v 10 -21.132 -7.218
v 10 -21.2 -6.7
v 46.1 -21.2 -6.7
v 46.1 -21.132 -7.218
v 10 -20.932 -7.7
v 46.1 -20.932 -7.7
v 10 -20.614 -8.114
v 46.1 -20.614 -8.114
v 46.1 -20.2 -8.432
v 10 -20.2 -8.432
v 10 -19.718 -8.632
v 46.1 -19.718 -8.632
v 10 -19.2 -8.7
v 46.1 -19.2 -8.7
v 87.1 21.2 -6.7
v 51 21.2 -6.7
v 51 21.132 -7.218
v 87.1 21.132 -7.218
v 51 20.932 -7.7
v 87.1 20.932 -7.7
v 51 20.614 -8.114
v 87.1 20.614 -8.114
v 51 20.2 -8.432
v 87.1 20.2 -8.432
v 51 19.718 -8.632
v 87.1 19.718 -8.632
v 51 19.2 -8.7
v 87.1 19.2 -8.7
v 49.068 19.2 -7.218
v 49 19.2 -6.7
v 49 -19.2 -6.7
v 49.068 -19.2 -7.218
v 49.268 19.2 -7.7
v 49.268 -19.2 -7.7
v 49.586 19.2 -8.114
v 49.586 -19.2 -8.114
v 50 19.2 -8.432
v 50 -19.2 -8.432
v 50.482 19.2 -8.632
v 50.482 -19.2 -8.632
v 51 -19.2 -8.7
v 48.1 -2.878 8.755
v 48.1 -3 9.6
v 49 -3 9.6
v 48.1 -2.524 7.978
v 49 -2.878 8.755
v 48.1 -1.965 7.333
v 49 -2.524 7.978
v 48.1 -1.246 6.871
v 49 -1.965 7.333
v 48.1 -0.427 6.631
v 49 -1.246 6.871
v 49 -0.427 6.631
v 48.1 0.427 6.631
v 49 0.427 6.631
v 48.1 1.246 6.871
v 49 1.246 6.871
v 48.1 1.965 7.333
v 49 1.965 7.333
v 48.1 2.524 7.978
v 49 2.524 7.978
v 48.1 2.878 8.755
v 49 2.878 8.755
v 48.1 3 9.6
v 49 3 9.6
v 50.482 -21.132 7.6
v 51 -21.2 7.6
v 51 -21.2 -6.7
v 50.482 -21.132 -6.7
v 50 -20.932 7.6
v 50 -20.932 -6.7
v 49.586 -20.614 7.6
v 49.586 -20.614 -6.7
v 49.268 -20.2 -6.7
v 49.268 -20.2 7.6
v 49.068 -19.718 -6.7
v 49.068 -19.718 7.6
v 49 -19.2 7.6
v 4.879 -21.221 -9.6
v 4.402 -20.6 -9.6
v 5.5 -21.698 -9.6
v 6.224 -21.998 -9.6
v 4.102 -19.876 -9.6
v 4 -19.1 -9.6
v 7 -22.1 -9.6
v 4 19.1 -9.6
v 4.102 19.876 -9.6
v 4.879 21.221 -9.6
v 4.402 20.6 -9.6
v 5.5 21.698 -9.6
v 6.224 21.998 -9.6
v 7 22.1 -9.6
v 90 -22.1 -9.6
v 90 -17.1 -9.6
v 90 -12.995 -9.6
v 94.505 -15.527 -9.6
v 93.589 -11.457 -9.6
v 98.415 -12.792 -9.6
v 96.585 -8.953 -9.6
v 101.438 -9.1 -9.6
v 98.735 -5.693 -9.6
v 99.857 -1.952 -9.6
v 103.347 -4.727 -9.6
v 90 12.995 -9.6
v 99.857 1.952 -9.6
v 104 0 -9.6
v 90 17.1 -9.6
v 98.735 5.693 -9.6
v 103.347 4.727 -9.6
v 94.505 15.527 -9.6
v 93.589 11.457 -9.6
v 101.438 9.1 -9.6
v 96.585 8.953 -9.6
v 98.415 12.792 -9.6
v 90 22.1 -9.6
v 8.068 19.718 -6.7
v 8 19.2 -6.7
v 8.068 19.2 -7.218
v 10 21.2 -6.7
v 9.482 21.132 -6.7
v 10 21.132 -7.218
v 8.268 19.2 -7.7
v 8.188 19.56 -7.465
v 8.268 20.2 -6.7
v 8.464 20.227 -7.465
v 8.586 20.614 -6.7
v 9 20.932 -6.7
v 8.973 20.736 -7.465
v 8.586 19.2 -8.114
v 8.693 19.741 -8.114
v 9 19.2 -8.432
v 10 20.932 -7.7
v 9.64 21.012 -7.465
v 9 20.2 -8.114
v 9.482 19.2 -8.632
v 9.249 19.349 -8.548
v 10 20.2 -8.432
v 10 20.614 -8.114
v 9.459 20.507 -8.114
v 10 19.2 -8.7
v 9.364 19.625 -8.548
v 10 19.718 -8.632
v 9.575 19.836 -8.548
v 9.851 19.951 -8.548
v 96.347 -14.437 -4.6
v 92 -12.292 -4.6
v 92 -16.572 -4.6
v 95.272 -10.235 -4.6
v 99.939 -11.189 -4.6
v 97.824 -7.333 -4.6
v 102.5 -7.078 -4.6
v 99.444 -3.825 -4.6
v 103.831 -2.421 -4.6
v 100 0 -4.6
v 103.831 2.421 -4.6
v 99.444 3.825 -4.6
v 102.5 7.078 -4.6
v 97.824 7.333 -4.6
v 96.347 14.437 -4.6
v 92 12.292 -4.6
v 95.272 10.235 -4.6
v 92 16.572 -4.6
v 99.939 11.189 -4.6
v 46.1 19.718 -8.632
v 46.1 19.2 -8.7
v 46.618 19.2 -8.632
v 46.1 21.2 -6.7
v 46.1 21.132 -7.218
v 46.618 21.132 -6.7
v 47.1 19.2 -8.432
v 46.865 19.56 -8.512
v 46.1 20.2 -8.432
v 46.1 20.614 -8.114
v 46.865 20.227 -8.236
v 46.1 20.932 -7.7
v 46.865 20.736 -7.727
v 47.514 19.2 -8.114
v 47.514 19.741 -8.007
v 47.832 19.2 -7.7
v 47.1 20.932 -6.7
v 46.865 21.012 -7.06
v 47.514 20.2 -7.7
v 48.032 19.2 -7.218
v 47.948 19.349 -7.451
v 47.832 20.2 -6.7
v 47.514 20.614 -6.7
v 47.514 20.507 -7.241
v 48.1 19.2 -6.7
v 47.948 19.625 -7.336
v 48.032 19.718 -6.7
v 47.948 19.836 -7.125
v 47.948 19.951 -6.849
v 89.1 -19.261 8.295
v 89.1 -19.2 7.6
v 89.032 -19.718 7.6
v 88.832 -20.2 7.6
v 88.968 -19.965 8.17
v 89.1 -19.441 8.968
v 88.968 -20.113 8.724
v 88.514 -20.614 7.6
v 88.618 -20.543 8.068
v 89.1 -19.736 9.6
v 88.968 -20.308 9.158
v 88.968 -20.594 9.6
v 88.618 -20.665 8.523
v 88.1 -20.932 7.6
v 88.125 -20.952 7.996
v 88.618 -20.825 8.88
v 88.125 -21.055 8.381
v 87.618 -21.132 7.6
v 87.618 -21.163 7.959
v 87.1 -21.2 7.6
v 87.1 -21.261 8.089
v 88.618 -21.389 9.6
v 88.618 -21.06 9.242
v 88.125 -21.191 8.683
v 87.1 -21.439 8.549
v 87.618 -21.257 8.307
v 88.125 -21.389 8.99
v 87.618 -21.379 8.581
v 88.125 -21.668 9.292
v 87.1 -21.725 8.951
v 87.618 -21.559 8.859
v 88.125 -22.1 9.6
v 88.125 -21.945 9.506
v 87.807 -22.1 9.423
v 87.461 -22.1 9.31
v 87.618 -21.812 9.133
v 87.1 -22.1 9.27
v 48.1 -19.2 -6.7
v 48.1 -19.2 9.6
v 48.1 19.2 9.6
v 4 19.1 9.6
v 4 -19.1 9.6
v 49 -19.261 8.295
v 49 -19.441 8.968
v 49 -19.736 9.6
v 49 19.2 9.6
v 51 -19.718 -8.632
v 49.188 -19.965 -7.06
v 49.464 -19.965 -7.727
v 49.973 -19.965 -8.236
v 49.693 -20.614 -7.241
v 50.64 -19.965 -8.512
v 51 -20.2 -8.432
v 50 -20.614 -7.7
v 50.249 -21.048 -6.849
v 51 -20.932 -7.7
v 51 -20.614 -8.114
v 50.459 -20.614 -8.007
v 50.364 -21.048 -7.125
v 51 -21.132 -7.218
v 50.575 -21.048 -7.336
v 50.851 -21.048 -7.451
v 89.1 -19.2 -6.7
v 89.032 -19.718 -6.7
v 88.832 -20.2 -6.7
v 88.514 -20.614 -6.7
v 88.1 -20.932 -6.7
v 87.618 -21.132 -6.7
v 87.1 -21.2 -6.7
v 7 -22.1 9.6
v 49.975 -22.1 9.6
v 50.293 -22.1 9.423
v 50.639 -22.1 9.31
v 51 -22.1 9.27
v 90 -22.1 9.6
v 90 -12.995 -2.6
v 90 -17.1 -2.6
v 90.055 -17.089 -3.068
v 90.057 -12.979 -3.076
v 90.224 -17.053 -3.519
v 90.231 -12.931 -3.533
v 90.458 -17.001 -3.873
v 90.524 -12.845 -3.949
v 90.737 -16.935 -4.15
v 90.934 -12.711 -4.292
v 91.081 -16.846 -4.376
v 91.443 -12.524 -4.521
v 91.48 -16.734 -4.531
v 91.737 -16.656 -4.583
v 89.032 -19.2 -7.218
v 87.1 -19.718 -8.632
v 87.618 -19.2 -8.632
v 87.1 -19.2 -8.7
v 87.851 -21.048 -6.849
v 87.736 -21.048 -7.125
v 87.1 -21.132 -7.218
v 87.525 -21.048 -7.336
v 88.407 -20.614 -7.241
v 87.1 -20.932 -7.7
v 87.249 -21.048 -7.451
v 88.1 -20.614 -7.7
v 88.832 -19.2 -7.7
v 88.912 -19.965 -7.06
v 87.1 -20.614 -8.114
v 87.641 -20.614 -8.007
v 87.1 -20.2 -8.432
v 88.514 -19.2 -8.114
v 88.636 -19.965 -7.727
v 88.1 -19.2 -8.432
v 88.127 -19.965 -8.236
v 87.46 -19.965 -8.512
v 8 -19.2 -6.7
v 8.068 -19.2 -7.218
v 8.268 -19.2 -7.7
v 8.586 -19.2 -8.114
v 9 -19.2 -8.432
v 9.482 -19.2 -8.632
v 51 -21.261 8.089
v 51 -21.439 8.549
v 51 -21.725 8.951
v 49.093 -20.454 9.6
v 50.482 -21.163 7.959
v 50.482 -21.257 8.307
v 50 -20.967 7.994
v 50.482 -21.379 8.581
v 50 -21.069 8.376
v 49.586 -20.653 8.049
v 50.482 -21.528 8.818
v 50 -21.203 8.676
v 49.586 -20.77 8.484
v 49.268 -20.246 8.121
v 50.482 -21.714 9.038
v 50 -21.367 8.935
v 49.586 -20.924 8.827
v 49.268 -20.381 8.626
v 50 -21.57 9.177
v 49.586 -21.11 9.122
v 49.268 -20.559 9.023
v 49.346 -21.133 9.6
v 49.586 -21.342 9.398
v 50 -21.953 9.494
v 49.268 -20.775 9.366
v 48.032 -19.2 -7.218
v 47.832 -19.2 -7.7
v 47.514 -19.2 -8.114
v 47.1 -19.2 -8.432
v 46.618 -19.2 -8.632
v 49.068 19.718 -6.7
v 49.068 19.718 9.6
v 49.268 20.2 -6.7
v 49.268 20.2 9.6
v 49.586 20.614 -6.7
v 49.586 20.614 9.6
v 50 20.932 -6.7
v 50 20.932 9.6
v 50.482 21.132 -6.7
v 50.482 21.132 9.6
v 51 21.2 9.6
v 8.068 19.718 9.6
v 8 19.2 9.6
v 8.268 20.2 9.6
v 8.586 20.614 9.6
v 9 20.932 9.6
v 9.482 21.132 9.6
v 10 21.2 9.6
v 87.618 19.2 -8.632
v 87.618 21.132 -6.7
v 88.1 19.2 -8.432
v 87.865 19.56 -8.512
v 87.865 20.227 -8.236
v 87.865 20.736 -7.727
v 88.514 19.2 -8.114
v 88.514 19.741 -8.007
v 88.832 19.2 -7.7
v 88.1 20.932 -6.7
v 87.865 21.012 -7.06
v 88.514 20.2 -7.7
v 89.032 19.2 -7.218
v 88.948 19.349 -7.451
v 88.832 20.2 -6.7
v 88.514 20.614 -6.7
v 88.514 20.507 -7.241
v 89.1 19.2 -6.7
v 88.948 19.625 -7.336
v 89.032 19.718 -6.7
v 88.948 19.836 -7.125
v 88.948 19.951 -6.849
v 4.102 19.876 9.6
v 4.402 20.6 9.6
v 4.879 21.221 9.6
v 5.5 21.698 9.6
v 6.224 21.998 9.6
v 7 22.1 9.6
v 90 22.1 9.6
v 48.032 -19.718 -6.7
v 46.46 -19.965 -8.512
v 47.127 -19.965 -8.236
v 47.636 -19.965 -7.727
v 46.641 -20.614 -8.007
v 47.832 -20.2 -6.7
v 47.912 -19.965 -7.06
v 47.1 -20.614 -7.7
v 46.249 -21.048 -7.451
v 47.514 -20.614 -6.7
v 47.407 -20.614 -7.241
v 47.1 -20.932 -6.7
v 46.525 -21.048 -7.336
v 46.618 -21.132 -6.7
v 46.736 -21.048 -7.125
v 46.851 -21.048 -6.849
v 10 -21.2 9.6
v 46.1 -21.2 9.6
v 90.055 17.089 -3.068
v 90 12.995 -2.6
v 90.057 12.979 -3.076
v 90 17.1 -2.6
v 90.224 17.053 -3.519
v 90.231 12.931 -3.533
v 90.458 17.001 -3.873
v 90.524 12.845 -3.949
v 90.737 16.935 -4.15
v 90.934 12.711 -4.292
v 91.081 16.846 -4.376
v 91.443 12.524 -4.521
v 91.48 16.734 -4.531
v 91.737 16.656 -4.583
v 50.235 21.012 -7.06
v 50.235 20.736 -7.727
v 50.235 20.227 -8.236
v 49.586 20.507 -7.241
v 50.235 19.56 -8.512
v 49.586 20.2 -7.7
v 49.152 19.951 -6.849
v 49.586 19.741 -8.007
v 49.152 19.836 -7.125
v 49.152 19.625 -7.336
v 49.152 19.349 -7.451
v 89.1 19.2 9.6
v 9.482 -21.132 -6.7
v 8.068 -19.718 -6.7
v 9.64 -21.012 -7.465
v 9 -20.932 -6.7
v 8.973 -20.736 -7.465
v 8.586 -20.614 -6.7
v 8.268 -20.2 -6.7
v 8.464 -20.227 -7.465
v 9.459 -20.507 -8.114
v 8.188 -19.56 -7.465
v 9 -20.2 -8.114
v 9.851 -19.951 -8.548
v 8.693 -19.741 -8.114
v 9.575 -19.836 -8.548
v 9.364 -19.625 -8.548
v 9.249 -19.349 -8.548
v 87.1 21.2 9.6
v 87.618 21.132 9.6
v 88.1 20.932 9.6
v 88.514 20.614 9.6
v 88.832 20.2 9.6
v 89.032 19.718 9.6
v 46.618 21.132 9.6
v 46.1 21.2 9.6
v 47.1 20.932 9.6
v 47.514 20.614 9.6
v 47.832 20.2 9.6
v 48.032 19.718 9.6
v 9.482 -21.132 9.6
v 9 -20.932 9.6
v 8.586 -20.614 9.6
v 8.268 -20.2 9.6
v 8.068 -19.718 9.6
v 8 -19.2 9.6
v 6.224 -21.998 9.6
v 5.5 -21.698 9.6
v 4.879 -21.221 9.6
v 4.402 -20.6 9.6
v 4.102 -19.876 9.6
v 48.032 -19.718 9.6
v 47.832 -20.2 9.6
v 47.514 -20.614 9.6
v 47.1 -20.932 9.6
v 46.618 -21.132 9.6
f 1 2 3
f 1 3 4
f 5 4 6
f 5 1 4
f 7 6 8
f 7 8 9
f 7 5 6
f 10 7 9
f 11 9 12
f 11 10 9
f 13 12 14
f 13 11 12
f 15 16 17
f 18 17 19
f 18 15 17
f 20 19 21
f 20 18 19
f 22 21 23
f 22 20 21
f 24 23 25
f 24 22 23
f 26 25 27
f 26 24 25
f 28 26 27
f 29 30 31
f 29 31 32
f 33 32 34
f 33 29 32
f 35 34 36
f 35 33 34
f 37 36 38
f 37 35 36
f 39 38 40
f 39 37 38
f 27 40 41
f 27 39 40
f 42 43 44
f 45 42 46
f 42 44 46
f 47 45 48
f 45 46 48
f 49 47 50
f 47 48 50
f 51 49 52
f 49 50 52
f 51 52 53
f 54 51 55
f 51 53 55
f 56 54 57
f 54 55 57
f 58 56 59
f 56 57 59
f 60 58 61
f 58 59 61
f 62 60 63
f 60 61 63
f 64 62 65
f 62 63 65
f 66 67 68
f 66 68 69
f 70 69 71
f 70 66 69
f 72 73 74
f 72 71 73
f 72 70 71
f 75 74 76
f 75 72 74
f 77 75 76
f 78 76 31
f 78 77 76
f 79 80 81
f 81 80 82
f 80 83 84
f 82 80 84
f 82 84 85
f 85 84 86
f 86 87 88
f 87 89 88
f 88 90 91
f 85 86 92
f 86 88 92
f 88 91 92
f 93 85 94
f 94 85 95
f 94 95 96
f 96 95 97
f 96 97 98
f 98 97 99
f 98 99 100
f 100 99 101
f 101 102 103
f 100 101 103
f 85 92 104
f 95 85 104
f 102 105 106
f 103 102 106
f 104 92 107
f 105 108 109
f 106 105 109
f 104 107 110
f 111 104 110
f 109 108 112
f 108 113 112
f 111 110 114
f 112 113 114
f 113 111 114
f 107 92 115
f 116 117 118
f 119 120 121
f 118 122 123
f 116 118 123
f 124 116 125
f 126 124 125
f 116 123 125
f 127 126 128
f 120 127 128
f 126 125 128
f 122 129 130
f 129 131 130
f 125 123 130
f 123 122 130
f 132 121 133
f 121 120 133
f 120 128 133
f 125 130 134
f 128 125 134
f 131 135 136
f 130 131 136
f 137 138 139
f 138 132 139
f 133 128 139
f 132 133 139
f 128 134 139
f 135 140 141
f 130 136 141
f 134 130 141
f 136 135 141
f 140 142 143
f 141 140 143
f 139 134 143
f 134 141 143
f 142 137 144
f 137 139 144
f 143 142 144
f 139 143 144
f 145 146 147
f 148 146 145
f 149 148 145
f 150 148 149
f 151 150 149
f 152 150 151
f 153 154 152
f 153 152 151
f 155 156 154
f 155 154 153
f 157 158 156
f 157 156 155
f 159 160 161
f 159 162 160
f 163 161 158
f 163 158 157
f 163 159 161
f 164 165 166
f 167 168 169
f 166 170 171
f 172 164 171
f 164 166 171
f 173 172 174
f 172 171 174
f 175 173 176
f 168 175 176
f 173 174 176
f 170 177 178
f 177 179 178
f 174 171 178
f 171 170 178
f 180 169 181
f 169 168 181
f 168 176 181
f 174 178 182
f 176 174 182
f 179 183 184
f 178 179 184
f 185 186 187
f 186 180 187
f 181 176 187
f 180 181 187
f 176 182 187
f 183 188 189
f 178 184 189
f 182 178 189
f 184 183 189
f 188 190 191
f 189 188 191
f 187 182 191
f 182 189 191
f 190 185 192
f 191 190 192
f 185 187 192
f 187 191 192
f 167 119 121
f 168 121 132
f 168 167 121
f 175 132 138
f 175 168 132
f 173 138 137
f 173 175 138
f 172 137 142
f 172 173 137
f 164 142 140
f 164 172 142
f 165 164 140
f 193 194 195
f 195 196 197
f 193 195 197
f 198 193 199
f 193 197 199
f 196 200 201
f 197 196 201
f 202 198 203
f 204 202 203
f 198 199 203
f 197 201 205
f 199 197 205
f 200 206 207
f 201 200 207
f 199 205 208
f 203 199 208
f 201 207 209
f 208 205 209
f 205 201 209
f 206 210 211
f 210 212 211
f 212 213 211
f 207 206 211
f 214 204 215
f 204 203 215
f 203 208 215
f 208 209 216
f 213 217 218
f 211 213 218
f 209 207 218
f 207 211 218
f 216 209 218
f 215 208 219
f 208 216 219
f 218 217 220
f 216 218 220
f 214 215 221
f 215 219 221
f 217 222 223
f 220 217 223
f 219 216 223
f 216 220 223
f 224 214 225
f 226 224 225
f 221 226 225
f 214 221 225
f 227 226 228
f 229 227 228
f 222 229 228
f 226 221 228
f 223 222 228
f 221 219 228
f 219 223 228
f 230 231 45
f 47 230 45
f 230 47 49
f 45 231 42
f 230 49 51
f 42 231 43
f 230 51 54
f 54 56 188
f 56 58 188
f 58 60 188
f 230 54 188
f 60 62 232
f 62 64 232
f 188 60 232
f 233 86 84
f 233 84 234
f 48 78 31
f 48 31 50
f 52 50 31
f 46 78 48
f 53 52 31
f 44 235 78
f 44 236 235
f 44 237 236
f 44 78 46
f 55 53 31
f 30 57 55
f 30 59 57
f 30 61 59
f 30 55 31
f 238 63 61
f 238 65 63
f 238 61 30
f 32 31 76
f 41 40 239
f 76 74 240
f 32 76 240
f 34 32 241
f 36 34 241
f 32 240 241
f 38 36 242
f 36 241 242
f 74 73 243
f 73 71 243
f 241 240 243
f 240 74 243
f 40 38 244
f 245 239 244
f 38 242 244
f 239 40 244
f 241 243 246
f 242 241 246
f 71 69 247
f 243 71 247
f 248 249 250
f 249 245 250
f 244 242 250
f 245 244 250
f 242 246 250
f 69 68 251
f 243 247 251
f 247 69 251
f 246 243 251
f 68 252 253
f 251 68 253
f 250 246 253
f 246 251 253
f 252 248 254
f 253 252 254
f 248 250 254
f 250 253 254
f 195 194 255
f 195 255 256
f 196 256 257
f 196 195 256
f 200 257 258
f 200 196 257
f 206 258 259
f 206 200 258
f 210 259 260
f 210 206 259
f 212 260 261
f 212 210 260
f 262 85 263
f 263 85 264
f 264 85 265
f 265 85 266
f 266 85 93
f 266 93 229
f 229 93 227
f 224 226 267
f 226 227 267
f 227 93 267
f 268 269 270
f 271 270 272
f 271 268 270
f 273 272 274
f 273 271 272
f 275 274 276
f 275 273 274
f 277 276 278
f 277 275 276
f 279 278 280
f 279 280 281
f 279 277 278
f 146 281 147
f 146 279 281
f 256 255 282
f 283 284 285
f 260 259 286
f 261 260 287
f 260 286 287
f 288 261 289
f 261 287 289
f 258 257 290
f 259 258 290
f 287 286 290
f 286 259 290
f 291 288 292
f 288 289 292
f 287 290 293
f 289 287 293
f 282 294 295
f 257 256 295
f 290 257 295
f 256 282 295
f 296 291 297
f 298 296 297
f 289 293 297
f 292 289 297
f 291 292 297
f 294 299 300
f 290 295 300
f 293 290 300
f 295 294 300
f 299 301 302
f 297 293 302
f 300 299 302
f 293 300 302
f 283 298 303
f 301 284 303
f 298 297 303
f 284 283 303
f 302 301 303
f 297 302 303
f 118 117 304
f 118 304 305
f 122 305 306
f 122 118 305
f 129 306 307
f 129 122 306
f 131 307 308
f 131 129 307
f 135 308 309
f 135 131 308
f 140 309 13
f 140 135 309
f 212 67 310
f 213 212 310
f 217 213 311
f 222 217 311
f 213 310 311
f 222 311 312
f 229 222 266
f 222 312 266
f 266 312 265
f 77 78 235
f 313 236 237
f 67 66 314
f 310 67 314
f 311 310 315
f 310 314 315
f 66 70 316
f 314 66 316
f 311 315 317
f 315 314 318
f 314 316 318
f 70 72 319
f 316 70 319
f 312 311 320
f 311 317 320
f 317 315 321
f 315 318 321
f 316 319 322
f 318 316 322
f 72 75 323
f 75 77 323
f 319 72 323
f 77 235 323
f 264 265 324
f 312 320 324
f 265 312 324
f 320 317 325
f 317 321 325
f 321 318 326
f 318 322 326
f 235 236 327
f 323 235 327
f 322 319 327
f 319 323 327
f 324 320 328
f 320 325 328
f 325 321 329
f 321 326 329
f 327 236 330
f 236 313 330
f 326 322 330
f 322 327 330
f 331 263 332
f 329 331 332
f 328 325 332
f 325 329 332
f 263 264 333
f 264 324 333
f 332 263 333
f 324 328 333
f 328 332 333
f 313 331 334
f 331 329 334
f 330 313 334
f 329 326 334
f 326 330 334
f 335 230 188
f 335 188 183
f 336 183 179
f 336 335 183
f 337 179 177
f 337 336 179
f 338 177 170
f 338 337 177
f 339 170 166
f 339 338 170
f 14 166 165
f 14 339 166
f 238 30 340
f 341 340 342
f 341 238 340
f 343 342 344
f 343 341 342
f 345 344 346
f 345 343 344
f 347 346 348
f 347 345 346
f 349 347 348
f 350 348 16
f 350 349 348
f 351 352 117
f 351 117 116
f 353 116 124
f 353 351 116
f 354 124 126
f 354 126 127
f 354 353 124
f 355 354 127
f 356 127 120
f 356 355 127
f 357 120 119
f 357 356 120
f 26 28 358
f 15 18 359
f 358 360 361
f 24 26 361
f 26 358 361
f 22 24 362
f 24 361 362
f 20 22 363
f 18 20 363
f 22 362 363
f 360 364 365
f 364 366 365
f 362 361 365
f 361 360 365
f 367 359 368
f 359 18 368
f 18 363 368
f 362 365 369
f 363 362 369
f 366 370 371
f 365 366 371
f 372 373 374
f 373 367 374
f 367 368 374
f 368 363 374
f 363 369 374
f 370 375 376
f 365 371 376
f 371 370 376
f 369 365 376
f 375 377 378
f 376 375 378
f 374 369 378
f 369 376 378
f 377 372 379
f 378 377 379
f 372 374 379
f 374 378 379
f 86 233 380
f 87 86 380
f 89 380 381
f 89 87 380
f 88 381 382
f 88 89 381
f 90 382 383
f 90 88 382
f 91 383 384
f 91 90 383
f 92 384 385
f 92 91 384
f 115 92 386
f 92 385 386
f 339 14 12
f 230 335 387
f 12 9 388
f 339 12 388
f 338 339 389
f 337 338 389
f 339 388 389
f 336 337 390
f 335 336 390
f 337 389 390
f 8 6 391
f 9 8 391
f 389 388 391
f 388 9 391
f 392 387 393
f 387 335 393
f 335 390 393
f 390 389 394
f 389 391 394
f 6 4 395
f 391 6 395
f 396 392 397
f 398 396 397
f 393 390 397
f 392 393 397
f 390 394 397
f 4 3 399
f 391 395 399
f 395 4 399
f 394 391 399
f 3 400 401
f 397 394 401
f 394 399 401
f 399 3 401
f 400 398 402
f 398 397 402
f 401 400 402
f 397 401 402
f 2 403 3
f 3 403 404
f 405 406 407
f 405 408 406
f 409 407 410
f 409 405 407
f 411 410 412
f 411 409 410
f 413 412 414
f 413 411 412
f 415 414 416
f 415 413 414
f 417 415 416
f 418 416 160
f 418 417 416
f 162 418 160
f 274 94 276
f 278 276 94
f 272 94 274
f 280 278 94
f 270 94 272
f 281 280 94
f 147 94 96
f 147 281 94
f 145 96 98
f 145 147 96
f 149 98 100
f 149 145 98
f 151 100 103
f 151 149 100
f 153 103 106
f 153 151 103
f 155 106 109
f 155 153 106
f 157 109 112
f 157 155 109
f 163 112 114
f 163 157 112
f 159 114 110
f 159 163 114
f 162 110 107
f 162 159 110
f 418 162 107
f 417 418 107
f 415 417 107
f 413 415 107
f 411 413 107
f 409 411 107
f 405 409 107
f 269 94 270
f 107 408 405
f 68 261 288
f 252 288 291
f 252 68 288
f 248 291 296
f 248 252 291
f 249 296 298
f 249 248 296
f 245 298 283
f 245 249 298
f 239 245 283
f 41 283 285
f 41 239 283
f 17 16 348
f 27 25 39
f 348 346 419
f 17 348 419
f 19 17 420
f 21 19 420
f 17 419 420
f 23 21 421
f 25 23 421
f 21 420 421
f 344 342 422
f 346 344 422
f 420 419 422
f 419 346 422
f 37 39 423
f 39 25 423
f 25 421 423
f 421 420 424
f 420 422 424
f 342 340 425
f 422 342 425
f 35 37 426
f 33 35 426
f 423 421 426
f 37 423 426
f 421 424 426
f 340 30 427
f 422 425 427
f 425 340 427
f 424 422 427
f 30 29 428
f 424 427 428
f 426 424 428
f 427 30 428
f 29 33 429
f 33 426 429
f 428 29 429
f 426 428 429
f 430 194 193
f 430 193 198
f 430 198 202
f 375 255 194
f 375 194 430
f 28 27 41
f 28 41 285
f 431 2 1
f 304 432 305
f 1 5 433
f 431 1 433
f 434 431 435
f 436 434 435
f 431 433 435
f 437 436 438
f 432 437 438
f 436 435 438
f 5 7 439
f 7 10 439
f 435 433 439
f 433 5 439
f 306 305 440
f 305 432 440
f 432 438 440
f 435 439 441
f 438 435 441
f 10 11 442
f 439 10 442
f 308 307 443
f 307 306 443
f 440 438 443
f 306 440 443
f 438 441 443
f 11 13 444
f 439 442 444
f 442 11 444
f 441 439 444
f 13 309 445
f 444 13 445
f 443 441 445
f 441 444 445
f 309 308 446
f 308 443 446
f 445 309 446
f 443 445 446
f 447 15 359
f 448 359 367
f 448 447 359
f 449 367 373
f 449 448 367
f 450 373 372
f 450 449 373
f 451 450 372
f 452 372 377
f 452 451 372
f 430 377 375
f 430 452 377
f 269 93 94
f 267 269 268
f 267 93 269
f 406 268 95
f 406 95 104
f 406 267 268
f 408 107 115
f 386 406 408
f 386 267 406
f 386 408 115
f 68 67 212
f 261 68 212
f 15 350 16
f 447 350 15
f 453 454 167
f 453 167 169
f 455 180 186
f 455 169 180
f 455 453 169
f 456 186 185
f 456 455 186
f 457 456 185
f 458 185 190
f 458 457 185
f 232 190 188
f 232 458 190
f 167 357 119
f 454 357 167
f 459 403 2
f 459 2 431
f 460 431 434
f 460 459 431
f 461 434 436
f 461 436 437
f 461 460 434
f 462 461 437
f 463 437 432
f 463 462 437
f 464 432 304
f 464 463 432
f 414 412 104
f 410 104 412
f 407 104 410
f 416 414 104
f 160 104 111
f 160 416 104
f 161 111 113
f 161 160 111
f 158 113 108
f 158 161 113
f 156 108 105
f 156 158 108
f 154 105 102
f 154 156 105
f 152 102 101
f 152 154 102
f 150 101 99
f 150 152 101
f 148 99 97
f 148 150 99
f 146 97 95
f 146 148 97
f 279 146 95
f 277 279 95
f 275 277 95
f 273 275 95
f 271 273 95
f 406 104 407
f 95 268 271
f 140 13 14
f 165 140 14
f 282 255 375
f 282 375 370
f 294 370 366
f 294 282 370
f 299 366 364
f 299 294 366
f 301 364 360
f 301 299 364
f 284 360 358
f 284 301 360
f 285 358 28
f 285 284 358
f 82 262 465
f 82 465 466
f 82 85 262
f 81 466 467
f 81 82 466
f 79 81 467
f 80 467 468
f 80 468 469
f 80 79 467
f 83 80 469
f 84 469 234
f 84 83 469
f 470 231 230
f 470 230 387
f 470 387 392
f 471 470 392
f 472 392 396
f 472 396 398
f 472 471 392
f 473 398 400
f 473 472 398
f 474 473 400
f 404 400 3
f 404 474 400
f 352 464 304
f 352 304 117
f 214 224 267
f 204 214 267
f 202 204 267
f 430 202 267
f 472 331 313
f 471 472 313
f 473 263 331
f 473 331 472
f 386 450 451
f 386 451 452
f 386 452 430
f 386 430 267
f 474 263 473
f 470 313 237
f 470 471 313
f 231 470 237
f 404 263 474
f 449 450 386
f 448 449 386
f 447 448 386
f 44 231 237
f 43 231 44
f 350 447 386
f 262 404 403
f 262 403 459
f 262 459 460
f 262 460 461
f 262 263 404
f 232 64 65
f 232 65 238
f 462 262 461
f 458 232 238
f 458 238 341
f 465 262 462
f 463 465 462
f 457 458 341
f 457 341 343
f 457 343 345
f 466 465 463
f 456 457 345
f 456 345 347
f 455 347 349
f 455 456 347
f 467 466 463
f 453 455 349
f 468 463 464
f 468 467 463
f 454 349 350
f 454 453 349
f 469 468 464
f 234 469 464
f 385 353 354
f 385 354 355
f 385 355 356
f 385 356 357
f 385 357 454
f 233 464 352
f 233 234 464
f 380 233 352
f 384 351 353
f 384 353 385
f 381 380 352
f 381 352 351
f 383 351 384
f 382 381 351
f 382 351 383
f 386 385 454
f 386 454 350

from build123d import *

# Parameters (mm, degrees)
SKETCH_1_W                  = 86
SKETCH_1_H                  = 44.2
EXTRUDE_1_DEPTH             = 14.2
EXTRUDE_2_DEPTH             = 5
SKETCH_3_W                  = 40.1
SKETCH_3_H                  = 42.4
CUT_EXTRUDE_1_DEPTH         = 18.3
SKETCH_4_W                  = 40.1
SKETCH_4_H                  = 42.4
CUT_EXTRUDE_2_DEPTH         = 18.3
HOLE_WIZARD_8_3_8_3_1_D     = 8.3
HOLE_WIZARD_8_3_8_3_1_DEPTH = 3.2
HOLE_WIZARD_6_0_6_1_D       = 6
HOLE_WIZARD_6_0_6_1_DEPTH   = 0.9
FILLET_1_R                  = 3
EXTRUDE_START               = -3.5
SKETCH_9_R                  = 4.15
EXTRUDE_3_DEPTH             = 3.5
FILLET_2_R                  = 2
FILLET_3_R                  = 2
FILLET_4_R                  = 2
FILLET_5_R                  = 2


with BuildPart() as part:
    # Эскиз1 → Бобышка-Вытянуть1 (new body)
    with BuildSketch(Plane.XY.offset(9.6)):
        with Locations((47, 0)):
            Rectangle(SKETCH_1_W, SKETCH_1_H)
    extrude(amount=-EXTRUDE_1_DEPTH)

    # Эскиз2 → Бобышка-Вытянуть2 (add)
    with BuildSketch(Plane(origin=(0, 0, -4.6), x_dir=(-1, 0, 0), z_dir=(0, 0, -1))):
        with BuildLine():
            Line((-90, -22.1), (-90, -17.1))
            ThreePointArc((-90, -17.1), (-104, 0), (-90, 17.1))
            Line((-90, 17.1), (-90, 22.1))
            Line((-90, 22.1), (-4, 22.1))
            Line((-4, 22.1), (-4, -22.1))
            Line((-4, -22.1), (-90, -22.1))
        make_face()
        with BuildLine():
            Line((-90, -12.994779171), (-90, 12.994779171))
            ThreePointArc((-90, 12.994779171), (-100, 0), (-90, -12.994779171))
        make_face(mode=Mode.SUBTRACT)
    extrude(amount=EXTRUDE_2_DEPTH)

    # Эскиз3 → Вырез-Вытянуть1 (cut)
    with BuildSketch(Plane.XY.offset(9.6)):
        with Locations((28.05, 0)):
            Rectangle(SKETCH_3_W, SKETCH_3_H)
    extrude(amount=-CUT_EXTRUDE_1_DEPTH, mode=Mode.SUBTRACT)

    # Эскиз4 → Вырез-Вытянуть2 (cut)
    with BuildSketch(Plane.XY.offset(9.6)):
        with Locations((69.05, 0)):
            Rectangle(SKETCH_4_W, SKETCH_4_H)
    extrude(amount=-CUT_EXTRUDE_2_DEPTH, mode=Mode.SUBTRACT)

    # Диаметр отверстия Ø8.3 (8.3)1
    with Locations(Plane.ZY.offset(-4)):
        with Locations((0, 0)):
            Hole(HOLE_WIZARD_8_3_8_3_1_D / 2, depth=HOLE_WIZARD_8_3_8_3_1_DEPTH)

    # Диаметр отверстия Ø6.0 (6)1
    with Locations(Plane.ZY.offset(-48.1)):
        with Locations((9.6, 0)):
            Hole(HOLE_WIZARD_6_0_6_1_D / 2, depth=HOLE_WIZARD_6_0_6_1_DEPTH)

    # Скругление1
    fillet_1_edges = [part.edges().sort_by_distance(p)[0] for p in [
        (4, -22.1, 0),
        (4, 22.1, 0),
    ]]
    fillet(fillet_1_edges, radius=FILLET_1_R)

    # Эскиз9 → Бобышка-Вытянуть3 (add)
    with BuildSketch(Plane.ZY.offset(-4).offset(EXTRUDE_START)):
        Circle(SKETCH_9_R)
    extrude(amount=EXTRUDE_3_DEPTH)

    # Скругление2
    # the kernel refuses this fillet: 2 mm, written as the material it adds along each edge
    with BuildSketch(Plane(origin=(51, 19.2, -6.7), x_dir=(0, 1, 0), z_dir=(-1, 0, 0))) as fillet_2_piece_1_section:
        Polygon((0, 0), (FILLET_2_R * 1.02, 0), (FILLET_2_R * 1.02, FILLET_2_R * 1.02), (0, FILLET_2_R * 1.02), align=None)
    fillet_2_piece_1 = extrude(amount=FILLET_2_R * 1.02, mode=Mode.PRIVATE)
    fillet_2_piece_1 = fillet_2_piece_1 - Plane(origin=(51, 19.2, -6.7), x_dir=(0, -0.7071067811865475, 0.7071067811865475), z_dir=(-1, 0, 0)) * Sphere(FILLET_2_R, mode=Mode.PRIVATE)
    add(fillet_2_piece_1)
    with BuildSketch(Plane(origin=(46.1, -19.2, -6.7), x_dir=(0, 0, -1), z_dir=(0, -1, 0))) as fillet_2_piece_2_section:
        Polygon((0, 0), (FILLET_2_R * 1.02, 0), (FILLET_2_R * 1.02, FILLET_2_R * 1.02), (0, FILLET_2_R * 1.02), align=None)
    fillet_2_piece_2 = extrude(amount=FILLET_2_R * 1.02, mode=Mode.PRIVATE)
    fillet_2_piece_2 = fillet_2_piece_2 - Plane(origin=(46.1, -19.2, -6.7), x_dir=(-0.7071067811865475, 0, 0.7071067811865475), z_dir=(0, -1, 0)) * Sphere(FILLET_2_R, mode=Mode.PRIVATE)
    add(fillet_2_piece_2)
    with BuildSketch(Plane(origin=(10, -19.2, -6.7), x_dir=(-1, 0, 0), z_dir=(0, 0, -1))) as fillet_2_piece_3_section:
        Polygon((0, 0), (FILLET_2_R * 1.02, 0), (FILLET_2_R * 1.02, -FILLET_2_R * 1.02), (0, -FILLET_2_R * 1.02), align=None)
    fillet_2_piece_3 = extrude(amount=FILLET_2_R * 1.02, mode=Mode.PRIVATE)
    fillet_2_piece_3 = fillet_2_piece_3 - Plane(origin=(10, -19.2, -6.7), x_dir=(0.707106781186543, 0.7071067811865519, 0), z_dir=(0, 0, -1)) * Sphere(FILLET_2_R, mode=Mode.PRIVATE)
    add(fillet_2_piece_3)
    with BuildSketch(Plane(origin=(10, 19.2, -6.7), x_dir=(0, 1, 0), z_dir=(0, 0, -1))) as fillet_2_piece_4_section:
        Polygon((0, 0), (FILLET_2_R * 1.02, 0), (FILLET_2_R * 1.02, -FILLET_2_R * 1.02), (0, -FILLET_2_R * 1.02), align=None)
    fillet_2_piece_4 = extrude(amount=FILLET_2_R * 1.02, mode=Mode.PRIVATE)
    fillet_2_piece_4 = fillet_2_piece_4 - Plane(origin=(10, 19.2, -6.7), x_dir=(0.7071067811865475, -0.7071067811865475, 0), z_dir=(0, 0, -1)) * Sphere(FILLET_2_R, mode=Mode.PRIVATE)
    add(fillet_2_piece_4)
    with BuildSketch(Plane(origin=(89.1, -21.2, -8.7), x_dir=(0, 0, 1), z_dir=(0, 1, 0))) as fillet_2_piece_5:
        with BuildLine():
            CenterArc((FILLET_2_R, -FILLET_2_R), FILLET_2_R, 90, 90)
            Line((0, -FILLET_2_R), (0, 0))
            Line((0, 0), (FILLET_2_R, 0))
        make_face()
    extrude(amount=42.4)
    with BuildSketch(Plane(origin=(89.1, 21.2, -8.7), x_dir=(0, 0, 1), z_dir=(-1, 0, 0))) as fillet_2_piece_6:
        with BuildLine():
            CenterArc((FILLET_2_R, -FILLET_2_R), FILLET_2_R, 90, 90)
            Line((0, -FILLET_2_R), (0, 0))
            Line((0, 0), (FILLET_2_R, 0))
        make_face()
    extrude(amount=38.1)
    with BuildSketch(Plane(origin=(49, 21.2, 9.6), x_dir=(0, -1, 0), z_dir=(0, 0, -1)), Plane(origin=(48.1, -21.2, 9.6), x_dir=(0, 1, 0), z_dir=(0, 0, -1))) as fillet_2_piece_7:
        with BuildLine():
            CenterArc((FILLET_2_R, -FILLET_2_R), FILLET_2_R, 90, 90)
            Line((0, -FILLET_2_R), (0, 0))
            Line((0, 0), (FILLET_2_R, 0))
        make_face()
    extrude(amount=16.3)
    with BuildSketch(Plane(origin=(8, -21.2, 9.6), x_dir=(0, 1, 0), z_dir=(0, 0, -1)), Plane(origin=(8, 21.2, 9.6), x_dir=(1, 0, 0), z_dir=(0, 0, -1))) as fillet_2_piece_8:
        with BuildLine():
            CenterArc((FILLET_2_R, FILLET_2_R), FILLET_2_R, 180, 90)
            Line((0, FILLET_2_R), (0, 0))
            Line((0, 0), (FILLET_2_R, 0))
        make_face()
    extrude(amount=16.3)
    with BuildSketch(Plane(origin=(49, 19.2, -8.7), x_dir=(0, 0, 1), z_dir=(0, -1, 0)), Plane(origin=(48.1, -19.2, -8.7), x_dir=(0, 0, 1), z_dir=(0, 1, 0))) as fillet_2_piece_9:
        with BuildLine():
            CenterArc((FILLET_2_R, -FILLET_2_R), FILLET_2_R, 90, 90)
            Line((0, -FILLET_2_R), (0, 0))
            Line((0, 0), (FILLET_2_R, 0))
        make_face()
    extrude(amount=40.4)
    with BuildSketch(Plane(origin=(53.1, 21.2, -8.7), x_dir=(0, 0, 1), z_dir=(-1, 0, 0))) as fillet_2_piece_10:
        with BuildLine():
            CenterArc((FILLET_2_R, -FILLET_2_R), FILLET_2_R, 90, 90)
            Line((0, -FILLET_2_R), (0, 0))
            Line((0, 0), (FILLET_2_R, 0))
        make_face()
    extrude(amount=43.1)
    with BuildSketch(Plane(origin=(10, -21.2, -8.7), x_dir=(0, 0, 1), z_dir=(1, 0, 0))) as fillet_2_piece_11:
        with BuildLine():
            CenterArc((FILLET_2_R, -FILLET_2_R), FILLET_2_R, 90, 90)
            Line((0, -FILLET_2_R), (0, 0))
            Line((0, 0), (FILLET_2_R, 0))
        make_face()
    extrude(amount=36.1)
    with BuildSketch(Plane(origin=(8, 19.2, -8.7), x_dir=(0, 0, 1), z_dir=(0, -1, 0))) as fillet_2_piece_12:
        with BuildLine():
            CenterArc((FILLET_2_R, -FILLET_2_R), FILLET_2_R, 90, 90)
            Line((0, -FILLET_2_R), (0, 0))
            Line((0, 0), (FILLET_2_R, 0))
        make_face()
    extrude(amount=38.4)
    # the kernel refuses this fillet: 2 mm, written as the material it takes off along each edge
    with BuildSketch(Plane(origin=(49, -21.2, 9.6), x_dir=(0, -1, 0), z_dir=(1, 0, 0))) as fillet_2_2_piece_1:
        with BuildLine():
            CenterArc((FILLET_2_R, FILLET_2_R), FILLET_2_R, 180, 90)
            Line((0, FILLET_2_R), (0, 0))
            Line((0, 0), (FILLET_2_R, 0))
        make_face()
    extrude(amount=40.1, mode=Mode.SUBTRACT)

    # Скругление3
    # the kernel refuses this fillet: 2 mm, written as the material it adds along each edge
    with BuildSketch(Plane(origin=(46.1, 19.2, -6.7), x_dir=(0, 1, 0), z_dir=(1, 0, 0))) as fillet_3_piece_1_section:
        Polygon((0, 0), (FILLET_3_R, 0), (FILLET_3_R, -FILLET_3_R), (0, -FILLET_3_R), align=None)
    fillet_3_piece_1 = extrude(amount=FILLET_3_R, mode=Mode.PRIVATE)
    fillet_3_piece_1 = fillet_3_piece_1 - Plane(origin=(46.1, 19.2, -6.7), x_dir=(0, -0.7071067811865475, 0.7071067811865475), z_dir=(1, 0, 0)) * Sphere(FILLET_3_R, mode=Mode.PRIVATE)
    add(fillet_3_piece_1)
    with BuildSketch(Plane(origin=(89.1, -23.2, 7.6), x_dir=(0, 1, 0), z_dir=(0, 0, -1))) as fillet_3_piece_2_section:
        with BuildLine():
            CenterArc((2 + FILLET_3_R, -FILLET_3_R), FILLET_3_R, 90, 90)
            Line((2, -FILLET_3_R), (2, 0))
            Line((2, 0), (2 + FILLET_3_R, 0))
        make_face()
    fillet_3_piece_2 = revolve(axis=Axis((89.1, -23.2, 7.6), (1, 0, 0)), revolution_arc=199.895215799, mode=Mode.PRIVATE)
    fillet_3_piece_2 = split(fillet_3_piece_2, bisect_by=Plane(origin=(88.655987969, -22.1, 8.63173809), z_dir=(0, 1, 0)), keep=Keep.TOP, mode=Mode.PRIVATE)
    fillet_3_piece_2 = split(fillet_3_piece_2, bisect_by=Plane(origin=(88.655987969, -21.07116748, 9.6), z_dir=(0, 0, -1)), keep=Keep.TOP, mode=Mode.PRIVATE)
    add(fillet_3_piece_2)
    with BuildSketch(Plane(origin=(89.1, -21.2, 7.6), x_dir=(0, 1, 0), z_dir=(0, 0, -1))) as fillet_3_piece_3:
        with BuildLine():
            CenterArc((FILLET_3_R, -FILLET_3_R), FILLET_3_R, 90, 90)
            Line((0, -FILLET_3_R), (0, 0))
            Line((0, 0), (FILLET_3_R, 0))
        make_face()
    extrude(amount=14.3)
    with BuildSketch(Plane(origin=(87.1, -21.2, -6.7), x_dir=(1, 0, 0), z_dir=(0, 0, 1))) as fillet_3_piece_4:
        with BuildLine():
            CenterArc((2 - FILLET_3_R, FILLET_3_R), FILLET_3_R, 270, 90)
            Line((2 - FILLET_3_R, 0), (2, 0))
            Line((2, 0), (2, FILLET_3_R))
        make_face()
    revolve(axis=Axis((87.1, -21.2, -6.7), (0, 1, 0)), revolution_arc=90)
    with BuildSketch(Plane(origin=(51, -21.2, -8.7), x_dir=(0, 1, 0), z_dir=(1, 0, 0))) as fillet_3_piece_5:
        with BuildLine():
            CenterArc((FILLET_3_R, FILLET_3_R), FILLET_3_R, 180, 90)
            Line((0, FILLET_3_R), (0, 0))
            Line((0, 0), (FILLET_3_R, 0))
        make_face()
    extrude(amount=36.1)
    with BuildSketch(Plane(origin=(51, -21.2, -6.7), x_dir=(-1, 0, 0), z_dir=(0, 0, 1))) as fillet_3_piece_6:
        with BuildLine():
            CenterArc((2 - FILLET_3_R, -FILLET_3_R), FILLET_3_R, 360, 90)
            Line((2, -FILLET_3_R), (2, 0))
            Line((2, 0), (2 - FILLET_3_R, 0))
        make_face()
    revolve(axis=Axis((51, -21.2, -6.7), (0, -1, 0)), revolution_arc=90)
    with BuildSketch(Plane(origin=(49, -23.2, 7.6), x_dir=(0, 1, 0), z_dir=(0, 0, -1))) as fillet_3_piece_7_section:
        with BuildLine():
            CenterArc((2 + FILLET_3_R, FILLET_3_R), FILLET_3_R, 180, 90)
            Line((2, FILLET_3_R), (2, 0))
            Line((2, 0), (2 + FILLET_3_R, 0))
        make_face()
    fillet_3_piece_7 = revolve(axis=Axis((49, -23.2, 7.6), (1, 0, 0)), revolution_arc=199.895215799, mode=Mode.PRIVATE)
    fillet_3_piece_7 = split(fillet_3_piece_7, bisect_by=Plane(origin=(49.444012031, -22.1, 8.63173809), z_dir=(0, 1, 0)), keep=Keep.TOP, mode=Mode.PRIVATE)
    fillet_3_piece_7 = split(fillet_3_piece_7, bisect_by=Plane(origin=(49.444012031, -21.07116748, 9.6), z_dir=(0, 0, -1)), keep=Keep.TOP, mode=Mode.PRIVATE)
    add(fillet_3_piece_7)
    with BuildSketch(Plane(origin=(49, -21.2, 7.6), x_dir=(0, 1, 0), z_dir=(0, 0, -1))) as fillet_3_piece_8:
        with BuildLine():
            CenterArc((FILLET_3_R, FILLET_3_R), FILLET_3_R, 180, 90)
            Line((0, FILLET_3_R), (0, 0))
            Line((0, 0), (FILLET_3_R, 0))
        make_face()
    extrude(amount=14.3)
    with BuildSketch(Plane(origin=(48.1, 21.2, 9.6), x_dir=(0, -1, 0), z_dir=(0, 0, -1))) as fillet_3_piece_9:
        with BuildLine():
            CenterArc((FILLET_3_R, FILLET_3_R), FILLET_3_R, 180, 90)
            Line((0, FILLET_3_R), (0, 0))
            Line((0, 0), (FILLET_3_R, 0))
        make_face()
    extrude(amount=16.3)

    # Скругление4
    # the kernel refuses this fillet: 2 mm, written as the material it adds along each edge
    with BuildSketch(Plane(origin=(87.1, 19.2, -6.7), x_dir=(0, 1, 0), z_dir=(1, 0, 0))) as fillet_4_piece_1_section:
        Polygon((0, 0), (FILLET_4_R, 0), (FILLET_4_R, -FILLET_4_R), (0, -FILLET_4_R), align=None)
    fillet_4_piece_1 = extrude(amount=FILLET_4_R, mode=Mode.PRIVATE)
    fillet_4_piece_1 = fillet_4_piece_1 - Plane(origin=(87.1, 19.2, -6.7), x_dir=(0, -0.7071067811865475, 0.7071067811865475), z_dir=(1, 0, 0)) * Sphere(FILLET_4_R, mode=Mode.PRIVATE)
    add(fillet_4_piece_1)
    with BuildSketch(Plane(origin=(89.1, 21.2, 9.6), x_dir=(0, -1, 0), z_dir=(0, 0, -1))) as fillet_4_piece_2:
        with BuildLine():
            CenterArc((FILLET_4_R, FILLET_4_R), FILLET_4_R, 180, 90)
            Line((0, FILLET_4_R), (0, 0))
            Line((0, 0), (FILLET_4_R, 0))
        make_face()
    extrude(amount=16.3)

    # Скругление5
    fillet_5_edges = [part.edges().sort_by_distance(p)[0] for p in [
        (90, -15.047389586, -4.6),
        (90, 15.047389586, -4.6),
    ]]
    fillet(fillet_5_edges, radius=FILLET_5_R)


solid = part.part
